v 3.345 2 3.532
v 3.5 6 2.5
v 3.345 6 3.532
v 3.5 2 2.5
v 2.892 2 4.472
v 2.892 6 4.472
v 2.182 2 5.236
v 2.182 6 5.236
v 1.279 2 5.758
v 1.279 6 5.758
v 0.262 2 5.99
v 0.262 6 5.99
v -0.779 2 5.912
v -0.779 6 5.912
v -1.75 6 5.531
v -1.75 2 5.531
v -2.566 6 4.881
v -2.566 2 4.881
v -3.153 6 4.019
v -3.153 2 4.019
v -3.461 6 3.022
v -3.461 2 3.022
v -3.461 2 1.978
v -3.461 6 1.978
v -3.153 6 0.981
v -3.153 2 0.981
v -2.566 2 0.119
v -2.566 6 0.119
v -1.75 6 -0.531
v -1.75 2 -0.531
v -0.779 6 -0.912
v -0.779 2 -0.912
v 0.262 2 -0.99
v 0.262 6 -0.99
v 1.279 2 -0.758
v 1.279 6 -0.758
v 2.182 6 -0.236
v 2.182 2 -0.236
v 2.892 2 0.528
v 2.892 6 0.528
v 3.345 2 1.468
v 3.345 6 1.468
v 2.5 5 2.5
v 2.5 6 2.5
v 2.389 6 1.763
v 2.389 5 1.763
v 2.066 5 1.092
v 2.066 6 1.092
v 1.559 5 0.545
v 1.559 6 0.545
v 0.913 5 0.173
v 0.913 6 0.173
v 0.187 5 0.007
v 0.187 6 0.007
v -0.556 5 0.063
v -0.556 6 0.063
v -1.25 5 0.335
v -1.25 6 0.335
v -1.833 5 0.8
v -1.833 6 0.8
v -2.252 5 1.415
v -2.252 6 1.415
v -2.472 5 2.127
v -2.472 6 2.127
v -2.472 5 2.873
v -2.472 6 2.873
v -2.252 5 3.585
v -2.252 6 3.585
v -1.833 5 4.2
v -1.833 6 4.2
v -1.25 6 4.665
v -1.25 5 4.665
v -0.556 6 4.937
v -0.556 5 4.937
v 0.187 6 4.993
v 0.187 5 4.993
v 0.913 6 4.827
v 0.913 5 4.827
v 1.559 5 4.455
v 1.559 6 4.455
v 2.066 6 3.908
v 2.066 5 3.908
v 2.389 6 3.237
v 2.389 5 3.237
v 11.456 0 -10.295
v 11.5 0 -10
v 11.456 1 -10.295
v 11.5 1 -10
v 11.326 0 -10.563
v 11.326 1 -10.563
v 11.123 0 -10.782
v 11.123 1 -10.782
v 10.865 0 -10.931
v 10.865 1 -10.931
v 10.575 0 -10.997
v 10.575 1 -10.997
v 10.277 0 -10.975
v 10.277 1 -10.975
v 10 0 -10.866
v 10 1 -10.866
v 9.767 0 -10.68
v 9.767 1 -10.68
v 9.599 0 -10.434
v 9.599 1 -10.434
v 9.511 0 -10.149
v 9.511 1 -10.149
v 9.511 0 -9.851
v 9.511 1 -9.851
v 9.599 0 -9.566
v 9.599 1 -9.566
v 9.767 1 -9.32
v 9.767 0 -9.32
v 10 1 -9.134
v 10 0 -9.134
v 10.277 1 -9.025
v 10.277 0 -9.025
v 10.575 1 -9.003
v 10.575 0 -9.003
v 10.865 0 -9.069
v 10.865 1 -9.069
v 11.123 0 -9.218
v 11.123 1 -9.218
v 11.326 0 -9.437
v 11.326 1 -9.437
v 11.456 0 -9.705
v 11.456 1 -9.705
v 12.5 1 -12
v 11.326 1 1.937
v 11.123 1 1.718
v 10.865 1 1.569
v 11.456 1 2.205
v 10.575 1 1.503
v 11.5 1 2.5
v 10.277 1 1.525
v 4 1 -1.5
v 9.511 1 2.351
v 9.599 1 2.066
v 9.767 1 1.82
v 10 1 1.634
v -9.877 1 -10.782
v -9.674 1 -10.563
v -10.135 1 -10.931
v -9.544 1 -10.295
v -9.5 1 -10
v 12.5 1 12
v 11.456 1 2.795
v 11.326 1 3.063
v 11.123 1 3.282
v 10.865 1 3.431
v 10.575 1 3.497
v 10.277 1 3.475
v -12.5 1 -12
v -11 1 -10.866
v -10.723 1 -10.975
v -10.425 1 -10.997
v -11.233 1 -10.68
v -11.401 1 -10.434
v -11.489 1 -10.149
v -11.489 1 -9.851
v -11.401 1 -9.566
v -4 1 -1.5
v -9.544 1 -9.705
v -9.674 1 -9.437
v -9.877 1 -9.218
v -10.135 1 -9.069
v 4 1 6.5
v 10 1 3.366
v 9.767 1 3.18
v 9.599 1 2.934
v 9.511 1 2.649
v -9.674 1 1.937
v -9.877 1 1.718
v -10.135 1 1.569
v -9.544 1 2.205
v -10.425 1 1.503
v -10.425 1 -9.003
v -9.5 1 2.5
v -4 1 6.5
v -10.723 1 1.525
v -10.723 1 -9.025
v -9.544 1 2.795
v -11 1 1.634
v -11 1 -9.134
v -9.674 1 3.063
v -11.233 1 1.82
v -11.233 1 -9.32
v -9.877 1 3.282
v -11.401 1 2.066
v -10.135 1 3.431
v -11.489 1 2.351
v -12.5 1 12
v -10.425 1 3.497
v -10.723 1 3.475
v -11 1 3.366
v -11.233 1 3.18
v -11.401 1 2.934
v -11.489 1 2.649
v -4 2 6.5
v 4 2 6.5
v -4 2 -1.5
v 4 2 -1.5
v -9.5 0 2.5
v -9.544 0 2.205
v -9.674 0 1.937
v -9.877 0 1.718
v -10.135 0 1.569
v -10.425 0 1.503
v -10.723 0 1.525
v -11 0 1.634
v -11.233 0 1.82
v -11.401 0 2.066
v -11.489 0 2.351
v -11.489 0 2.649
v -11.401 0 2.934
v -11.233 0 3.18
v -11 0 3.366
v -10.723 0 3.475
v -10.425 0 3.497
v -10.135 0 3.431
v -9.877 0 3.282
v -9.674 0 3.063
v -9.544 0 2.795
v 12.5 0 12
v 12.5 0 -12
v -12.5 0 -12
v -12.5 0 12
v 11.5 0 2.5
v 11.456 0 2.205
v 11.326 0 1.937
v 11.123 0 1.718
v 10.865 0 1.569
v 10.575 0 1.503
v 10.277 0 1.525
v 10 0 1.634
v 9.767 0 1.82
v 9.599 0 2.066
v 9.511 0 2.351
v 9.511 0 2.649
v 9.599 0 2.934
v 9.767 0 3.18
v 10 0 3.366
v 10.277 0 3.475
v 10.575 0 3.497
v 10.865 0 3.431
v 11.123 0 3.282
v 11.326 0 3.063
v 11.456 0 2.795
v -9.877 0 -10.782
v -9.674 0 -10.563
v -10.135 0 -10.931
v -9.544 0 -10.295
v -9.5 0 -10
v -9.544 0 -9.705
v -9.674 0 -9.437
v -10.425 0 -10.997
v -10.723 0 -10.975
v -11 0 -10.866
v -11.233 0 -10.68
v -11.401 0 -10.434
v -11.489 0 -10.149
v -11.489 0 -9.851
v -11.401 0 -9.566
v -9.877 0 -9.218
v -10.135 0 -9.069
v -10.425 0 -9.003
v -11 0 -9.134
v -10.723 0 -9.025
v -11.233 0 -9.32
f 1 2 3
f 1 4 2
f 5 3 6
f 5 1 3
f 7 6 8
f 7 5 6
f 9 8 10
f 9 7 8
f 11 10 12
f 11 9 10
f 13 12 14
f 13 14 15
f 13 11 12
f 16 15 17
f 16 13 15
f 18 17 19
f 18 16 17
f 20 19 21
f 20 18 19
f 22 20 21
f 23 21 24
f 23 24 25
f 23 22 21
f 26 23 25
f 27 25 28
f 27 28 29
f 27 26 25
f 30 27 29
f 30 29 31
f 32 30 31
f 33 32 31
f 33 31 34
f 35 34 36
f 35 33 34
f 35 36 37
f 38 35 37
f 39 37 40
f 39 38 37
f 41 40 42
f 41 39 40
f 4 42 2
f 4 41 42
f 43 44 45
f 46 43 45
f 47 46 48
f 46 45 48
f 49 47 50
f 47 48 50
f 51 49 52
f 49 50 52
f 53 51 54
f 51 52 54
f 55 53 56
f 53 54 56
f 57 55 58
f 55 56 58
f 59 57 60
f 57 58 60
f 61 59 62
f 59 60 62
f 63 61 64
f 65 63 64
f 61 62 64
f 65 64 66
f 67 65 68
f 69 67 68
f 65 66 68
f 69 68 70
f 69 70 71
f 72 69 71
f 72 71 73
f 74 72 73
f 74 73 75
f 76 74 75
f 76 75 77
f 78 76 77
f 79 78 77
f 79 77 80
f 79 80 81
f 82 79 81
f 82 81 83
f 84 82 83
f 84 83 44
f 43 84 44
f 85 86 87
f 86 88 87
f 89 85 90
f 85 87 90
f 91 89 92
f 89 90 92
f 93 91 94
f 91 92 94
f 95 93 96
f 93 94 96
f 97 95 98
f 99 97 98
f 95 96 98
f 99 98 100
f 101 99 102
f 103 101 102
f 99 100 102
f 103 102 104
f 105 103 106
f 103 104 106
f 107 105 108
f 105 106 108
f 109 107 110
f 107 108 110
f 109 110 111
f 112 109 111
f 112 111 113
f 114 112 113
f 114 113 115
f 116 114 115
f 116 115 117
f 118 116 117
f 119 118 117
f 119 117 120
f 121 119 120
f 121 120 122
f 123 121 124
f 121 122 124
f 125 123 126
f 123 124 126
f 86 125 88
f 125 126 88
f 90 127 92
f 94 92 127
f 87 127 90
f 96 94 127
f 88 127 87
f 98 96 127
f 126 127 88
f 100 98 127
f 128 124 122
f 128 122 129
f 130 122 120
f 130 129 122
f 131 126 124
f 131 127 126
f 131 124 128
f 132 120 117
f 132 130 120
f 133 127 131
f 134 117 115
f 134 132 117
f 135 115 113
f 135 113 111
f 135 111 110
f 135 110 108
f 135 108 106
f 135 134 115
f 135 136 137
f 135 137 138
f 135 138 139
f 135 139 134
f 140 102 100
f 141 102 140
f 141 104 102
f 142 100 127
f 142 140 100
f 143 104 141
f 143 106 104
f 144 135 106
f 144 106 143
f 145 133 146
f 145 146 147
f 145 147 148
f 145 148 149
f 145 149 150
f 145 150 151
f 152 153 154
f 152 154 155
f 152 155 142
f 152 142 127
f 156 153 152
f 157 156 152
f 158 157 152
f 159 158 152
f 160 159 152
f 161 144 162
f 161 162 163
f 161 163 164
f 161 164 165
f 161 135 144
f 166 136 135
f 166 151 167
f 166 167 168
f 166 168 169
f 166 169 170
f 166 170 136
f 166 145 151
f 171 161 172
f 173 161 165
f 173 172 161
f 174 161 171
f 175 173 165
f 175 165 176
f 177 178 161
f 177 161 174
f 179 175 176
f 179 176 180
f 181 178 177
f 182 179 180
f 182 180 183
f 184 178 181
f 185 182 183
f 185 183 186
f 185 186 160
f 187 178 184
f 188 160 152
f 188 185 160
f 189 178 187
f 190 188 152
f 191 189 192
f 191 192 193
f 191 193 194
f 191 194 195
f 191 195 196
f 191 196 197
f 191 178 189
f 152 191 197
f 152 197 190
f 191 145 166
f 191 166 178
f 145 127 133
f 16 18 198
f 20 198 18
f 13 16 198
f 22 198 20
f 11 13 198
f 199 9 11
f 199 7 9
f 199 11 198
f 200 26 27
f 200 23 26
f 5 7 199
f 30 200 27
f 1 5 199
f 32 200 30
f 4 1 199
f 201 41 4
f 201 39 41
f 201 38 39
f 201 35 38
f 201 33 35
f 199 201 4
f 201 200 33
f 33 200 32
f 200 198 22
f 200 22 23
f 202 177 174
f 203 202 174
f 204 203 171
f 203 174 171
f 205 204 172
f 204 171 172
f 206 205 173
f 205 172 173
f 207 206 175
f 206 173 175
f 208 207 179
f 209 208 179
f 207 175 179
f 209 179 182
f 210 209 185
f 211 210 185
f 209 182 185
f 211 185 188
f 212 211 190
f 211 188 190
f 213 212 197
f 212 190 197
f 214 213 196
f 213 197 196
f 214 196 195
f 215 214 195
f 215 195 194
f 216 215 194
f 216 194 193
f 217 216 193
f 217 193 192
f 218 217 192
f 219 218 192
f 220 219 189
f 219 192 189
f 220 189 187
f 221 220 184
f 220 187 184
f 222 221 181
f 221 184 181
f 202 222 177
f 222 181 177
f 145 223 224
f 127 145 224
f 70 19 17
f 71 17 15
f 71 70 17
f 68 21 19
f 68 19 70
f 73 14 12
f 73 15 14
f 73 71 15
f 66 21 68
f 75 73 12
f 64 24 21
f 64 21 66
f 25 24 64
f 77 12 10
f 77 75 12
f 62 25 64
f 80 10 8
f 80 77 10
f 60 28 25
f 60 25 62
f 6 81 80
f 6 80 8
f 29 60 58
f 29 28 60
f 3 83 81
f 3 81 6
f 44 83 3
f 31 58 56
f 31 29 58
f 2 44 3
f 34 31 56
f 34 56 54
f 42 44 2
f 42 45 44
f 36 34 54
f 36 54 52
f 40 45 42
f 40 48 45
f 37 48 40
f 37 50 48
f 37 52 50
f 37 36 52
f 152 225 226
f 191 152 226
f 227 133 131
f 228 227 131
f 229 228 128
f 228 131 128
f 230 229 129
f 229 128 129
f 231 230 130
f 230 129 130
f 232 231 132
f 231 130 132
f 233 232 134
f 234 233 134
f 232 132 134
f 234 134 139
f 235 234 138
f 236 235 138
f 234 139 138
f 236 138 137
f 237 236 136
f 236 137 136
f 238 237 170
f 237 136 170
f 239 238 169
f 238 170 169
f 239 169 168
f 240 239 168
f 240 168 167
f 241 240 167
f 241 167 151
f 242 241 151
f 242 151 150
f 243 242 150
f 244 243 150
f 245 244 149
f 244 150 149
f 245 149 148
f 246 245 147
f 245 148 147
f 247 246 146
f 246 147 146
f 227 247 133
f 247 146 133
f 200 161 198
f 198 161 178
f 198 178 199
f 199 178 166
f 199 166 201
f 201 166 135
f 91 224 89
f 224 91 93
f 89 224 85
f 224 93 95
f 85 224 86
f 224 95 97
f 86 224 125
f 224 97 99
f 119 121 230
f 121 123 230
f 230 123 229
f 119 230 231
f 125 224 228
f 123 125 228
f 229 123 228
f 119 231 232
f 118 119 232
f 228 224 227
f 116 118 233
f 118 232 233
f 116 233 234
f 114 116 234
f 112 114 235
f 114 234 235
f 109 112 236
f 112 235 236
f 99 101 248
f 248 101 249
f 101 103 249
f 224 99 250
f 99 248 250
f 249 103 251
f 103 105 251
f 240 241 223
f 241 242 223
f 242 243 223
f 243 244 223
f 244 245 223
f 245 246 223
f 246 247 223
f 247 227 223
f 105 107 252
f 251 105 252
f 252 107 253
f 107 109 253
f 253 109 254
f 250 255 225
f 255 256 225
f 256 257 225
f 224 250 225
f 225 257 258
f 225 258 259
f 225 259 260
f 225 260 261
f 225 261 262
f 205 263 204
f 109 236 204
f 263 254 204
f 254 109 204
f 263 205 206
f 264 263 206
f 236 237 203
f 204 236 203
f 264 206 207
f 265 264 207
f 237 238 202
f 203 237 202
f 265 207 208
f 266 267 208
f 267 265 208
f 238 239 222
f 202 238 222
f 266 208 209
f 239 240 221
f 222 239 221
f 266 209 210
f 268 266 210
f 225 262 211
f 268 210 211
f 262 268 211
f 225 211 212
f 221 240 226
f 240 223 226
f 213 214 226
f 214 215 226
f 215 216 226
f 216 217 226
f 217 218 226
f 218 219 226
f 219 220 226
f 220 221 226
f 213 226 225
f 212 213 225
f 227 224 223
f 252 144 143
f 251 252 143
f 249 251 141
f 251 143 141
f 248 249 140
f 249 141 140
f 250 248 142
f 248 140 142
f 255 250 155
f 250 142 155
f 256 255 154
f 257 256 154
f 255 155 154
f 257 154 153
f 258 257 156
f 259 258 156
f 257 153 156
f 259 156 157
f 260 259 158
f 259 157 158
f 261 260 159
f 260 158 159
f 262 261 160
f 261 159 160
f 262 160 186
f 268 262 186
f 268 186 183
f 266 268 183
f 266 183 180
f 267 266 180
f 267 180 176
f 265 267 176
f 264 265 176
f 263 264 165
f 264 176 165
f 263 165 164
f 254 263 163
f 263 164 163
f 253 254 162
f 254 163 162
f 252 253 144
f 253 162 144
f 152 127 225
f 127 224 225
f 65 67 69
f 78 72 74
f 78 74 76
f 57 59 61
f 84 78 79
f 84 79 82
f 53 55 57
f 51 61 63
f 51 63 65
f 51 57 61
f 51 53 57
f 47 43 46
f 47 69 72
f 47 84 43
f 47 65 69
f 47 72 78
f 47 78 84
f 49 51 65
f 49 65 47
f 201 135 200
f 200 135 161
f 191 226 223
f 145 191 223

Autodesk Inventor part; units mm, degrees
ref_plane "YZ Plane" through (0, 0, 0) normal (1, 0, 0) x (0, 1, 0)
ref_plane "XZ Plane" through (0, 0, 0) normal (0, 1, 0) x (-1, 0, 0)
ref_plane "XY Plane" through (0, 0, 0) normal (0, 0, 1) x (1, 0, 0)
sketch "Sketch1" plane through (0, 0, 0) normal (0, 1, 0) x (-1, 0, 0)
  line L0 (12.5, 12) -> (-12.5, 12)
  line L1 (-12.5, 12) -> (-12.5, -12)
  line L2 (-12.5, -12) -> (12.5, -12)
  line L3 (12.5, -12) -> (12.5, 12)
  line L4 (12.5, 12) -> (-12.5, -12) construction
  line L5 (-12.5, 12) -> (12.5, -12) construction
  point P0 (0, 0)
  dimension "d0" = 25
  dimension "d1" = 24
extrude "Extrusion1" add sketch "Sketch1" along normal blind 1
sketch "Sketch2" plane through (0, 1, 0) normal (0, 1, 0) x (1, 0, 0)
  line L0 (-12.5, 12) -> (-10.5, 12)
  line L1 (-10.5, 12) -> (-10.5, 10)
  line L2 (-10.5, 10) -> (-12.5, 10)
  line L3 (-12.5, 10) -> (-12.5, 12)
  line L4 (12.5, 12) -> (10.5, 12)
  line L5 (10.5, 12) -> (10.5, 10)
  line L6 (10.5, 10) -> (12.5, 10)
  line L7 (12.5, 10) -> (12.5, 12)
  line L8 (-12.5, 12) -> (-10.5, 12)
  line L9 (-10.5, 12) -> (-10.5, -2.5)
  line L10 (-10.5, -2.5) -> (-12.5, -2.5)
  line L11 (-12.5, -2.5) -> (-12.5, 12)
  line L12 (12.5, 12) -> (10.5, 12)
  line L13 (10.5, 12) -> (10.5, -2.5)
  line L14 (10.5, -2.5) -> (12.5, -2.5)
  line L15 (12.5, -2.5) -> (12.5, 12)
  circle A0 centre (-10.5, 10) radius 1
  circle A1 centre (-10.5, -2.5) radius 1
  circle A2 centre (10.5, -2.5) radius 1
  circle A3 centre (10.5, 10) radius 1
  point P0 (0, 0)
  dimension "d4" = 2
  dimension "d5" = 2
  dimension "d6" = 2
  dimension "d7" = 2
  dimension "d8" = 14.5
  dimension "d9" = 14.5
  dimension "d10" = 2
  dimension "d11" = 2
  dimension "d12" = 2
  dimension "d13" = 2
extrude "Extrusion2" cut sketch "Sketch2" against normal up to next contours A0 L9 L1 | L1 L2 A0 | L2 L9 A0 | A1 L9 L10 | L10 L9 A1 | A3 L6 L5 | L5 L13 A3 | A3 L13 L6 | A2 L13 L14 | L14 L13 A2
sketch "Sketch3" plane through (0, 1, 0) normal (0, 1, 0) x (1, 0, 0)
  circle A0 centre (-10.5, -2.5) radius 1 projected
  circle A1 centre (10.5, -2.5) radius 1 projected
  line L0 (-12.5, 12) -> (-12.5, -12) projected
  line L1 (-10.5, -2.5) -> (10.5, -2.5)
  line L2 (-4, -6.5) -> (4, -6.5)
  line L3 (4, -6.5) -> (4, 1.5)
  line L4 (4, 1.5) -> (-4, 1.5)
  line L5 (-4, 1.5) -> (-4, -6.5)
  line L6 (-4, -6.5) -> (4, 1.5) construction
  line L7 (4, -6.5) -> (-4, 1.5) construction
  point P0 (0, 0)
  point P1 (0, -2.5)
  dimension "d16" = 8
  dimension "d17" = 8
extrude "Extrusion3" add sketch "Sketch3" along normal blind 1 contours L5 L4 L3 L1 | L1 L3 L2 L5
sketch "Sketch4" plane through (0, 2, 0) normal (0, 1, 0) x (1, 0, 0)
  line L0 (-4, 1.5) -> (4, -6.5)
  circle A0 centre (0, -2.5) radius 3.5
  point P0 (0, 0)
  dimension "d20" = 7
extrude "Extrusion4" add sketch "Sketch4" along normal blind 4
sketch "Sketch5" plane through (0, 6, 2.5) normal (0, 1, 0) x (1, 0, 0)
  circle A0 centre (0, 0) radius 3.5 projected
  circle A1 centre (0, 0) radius 2.5
  point P0 (0, 2.5)
  dimension "d23" = 5
extrude "Extrusion5" cut sketch "Sketch5" against normal blind 1 contours A1
properties part number "kamera"
